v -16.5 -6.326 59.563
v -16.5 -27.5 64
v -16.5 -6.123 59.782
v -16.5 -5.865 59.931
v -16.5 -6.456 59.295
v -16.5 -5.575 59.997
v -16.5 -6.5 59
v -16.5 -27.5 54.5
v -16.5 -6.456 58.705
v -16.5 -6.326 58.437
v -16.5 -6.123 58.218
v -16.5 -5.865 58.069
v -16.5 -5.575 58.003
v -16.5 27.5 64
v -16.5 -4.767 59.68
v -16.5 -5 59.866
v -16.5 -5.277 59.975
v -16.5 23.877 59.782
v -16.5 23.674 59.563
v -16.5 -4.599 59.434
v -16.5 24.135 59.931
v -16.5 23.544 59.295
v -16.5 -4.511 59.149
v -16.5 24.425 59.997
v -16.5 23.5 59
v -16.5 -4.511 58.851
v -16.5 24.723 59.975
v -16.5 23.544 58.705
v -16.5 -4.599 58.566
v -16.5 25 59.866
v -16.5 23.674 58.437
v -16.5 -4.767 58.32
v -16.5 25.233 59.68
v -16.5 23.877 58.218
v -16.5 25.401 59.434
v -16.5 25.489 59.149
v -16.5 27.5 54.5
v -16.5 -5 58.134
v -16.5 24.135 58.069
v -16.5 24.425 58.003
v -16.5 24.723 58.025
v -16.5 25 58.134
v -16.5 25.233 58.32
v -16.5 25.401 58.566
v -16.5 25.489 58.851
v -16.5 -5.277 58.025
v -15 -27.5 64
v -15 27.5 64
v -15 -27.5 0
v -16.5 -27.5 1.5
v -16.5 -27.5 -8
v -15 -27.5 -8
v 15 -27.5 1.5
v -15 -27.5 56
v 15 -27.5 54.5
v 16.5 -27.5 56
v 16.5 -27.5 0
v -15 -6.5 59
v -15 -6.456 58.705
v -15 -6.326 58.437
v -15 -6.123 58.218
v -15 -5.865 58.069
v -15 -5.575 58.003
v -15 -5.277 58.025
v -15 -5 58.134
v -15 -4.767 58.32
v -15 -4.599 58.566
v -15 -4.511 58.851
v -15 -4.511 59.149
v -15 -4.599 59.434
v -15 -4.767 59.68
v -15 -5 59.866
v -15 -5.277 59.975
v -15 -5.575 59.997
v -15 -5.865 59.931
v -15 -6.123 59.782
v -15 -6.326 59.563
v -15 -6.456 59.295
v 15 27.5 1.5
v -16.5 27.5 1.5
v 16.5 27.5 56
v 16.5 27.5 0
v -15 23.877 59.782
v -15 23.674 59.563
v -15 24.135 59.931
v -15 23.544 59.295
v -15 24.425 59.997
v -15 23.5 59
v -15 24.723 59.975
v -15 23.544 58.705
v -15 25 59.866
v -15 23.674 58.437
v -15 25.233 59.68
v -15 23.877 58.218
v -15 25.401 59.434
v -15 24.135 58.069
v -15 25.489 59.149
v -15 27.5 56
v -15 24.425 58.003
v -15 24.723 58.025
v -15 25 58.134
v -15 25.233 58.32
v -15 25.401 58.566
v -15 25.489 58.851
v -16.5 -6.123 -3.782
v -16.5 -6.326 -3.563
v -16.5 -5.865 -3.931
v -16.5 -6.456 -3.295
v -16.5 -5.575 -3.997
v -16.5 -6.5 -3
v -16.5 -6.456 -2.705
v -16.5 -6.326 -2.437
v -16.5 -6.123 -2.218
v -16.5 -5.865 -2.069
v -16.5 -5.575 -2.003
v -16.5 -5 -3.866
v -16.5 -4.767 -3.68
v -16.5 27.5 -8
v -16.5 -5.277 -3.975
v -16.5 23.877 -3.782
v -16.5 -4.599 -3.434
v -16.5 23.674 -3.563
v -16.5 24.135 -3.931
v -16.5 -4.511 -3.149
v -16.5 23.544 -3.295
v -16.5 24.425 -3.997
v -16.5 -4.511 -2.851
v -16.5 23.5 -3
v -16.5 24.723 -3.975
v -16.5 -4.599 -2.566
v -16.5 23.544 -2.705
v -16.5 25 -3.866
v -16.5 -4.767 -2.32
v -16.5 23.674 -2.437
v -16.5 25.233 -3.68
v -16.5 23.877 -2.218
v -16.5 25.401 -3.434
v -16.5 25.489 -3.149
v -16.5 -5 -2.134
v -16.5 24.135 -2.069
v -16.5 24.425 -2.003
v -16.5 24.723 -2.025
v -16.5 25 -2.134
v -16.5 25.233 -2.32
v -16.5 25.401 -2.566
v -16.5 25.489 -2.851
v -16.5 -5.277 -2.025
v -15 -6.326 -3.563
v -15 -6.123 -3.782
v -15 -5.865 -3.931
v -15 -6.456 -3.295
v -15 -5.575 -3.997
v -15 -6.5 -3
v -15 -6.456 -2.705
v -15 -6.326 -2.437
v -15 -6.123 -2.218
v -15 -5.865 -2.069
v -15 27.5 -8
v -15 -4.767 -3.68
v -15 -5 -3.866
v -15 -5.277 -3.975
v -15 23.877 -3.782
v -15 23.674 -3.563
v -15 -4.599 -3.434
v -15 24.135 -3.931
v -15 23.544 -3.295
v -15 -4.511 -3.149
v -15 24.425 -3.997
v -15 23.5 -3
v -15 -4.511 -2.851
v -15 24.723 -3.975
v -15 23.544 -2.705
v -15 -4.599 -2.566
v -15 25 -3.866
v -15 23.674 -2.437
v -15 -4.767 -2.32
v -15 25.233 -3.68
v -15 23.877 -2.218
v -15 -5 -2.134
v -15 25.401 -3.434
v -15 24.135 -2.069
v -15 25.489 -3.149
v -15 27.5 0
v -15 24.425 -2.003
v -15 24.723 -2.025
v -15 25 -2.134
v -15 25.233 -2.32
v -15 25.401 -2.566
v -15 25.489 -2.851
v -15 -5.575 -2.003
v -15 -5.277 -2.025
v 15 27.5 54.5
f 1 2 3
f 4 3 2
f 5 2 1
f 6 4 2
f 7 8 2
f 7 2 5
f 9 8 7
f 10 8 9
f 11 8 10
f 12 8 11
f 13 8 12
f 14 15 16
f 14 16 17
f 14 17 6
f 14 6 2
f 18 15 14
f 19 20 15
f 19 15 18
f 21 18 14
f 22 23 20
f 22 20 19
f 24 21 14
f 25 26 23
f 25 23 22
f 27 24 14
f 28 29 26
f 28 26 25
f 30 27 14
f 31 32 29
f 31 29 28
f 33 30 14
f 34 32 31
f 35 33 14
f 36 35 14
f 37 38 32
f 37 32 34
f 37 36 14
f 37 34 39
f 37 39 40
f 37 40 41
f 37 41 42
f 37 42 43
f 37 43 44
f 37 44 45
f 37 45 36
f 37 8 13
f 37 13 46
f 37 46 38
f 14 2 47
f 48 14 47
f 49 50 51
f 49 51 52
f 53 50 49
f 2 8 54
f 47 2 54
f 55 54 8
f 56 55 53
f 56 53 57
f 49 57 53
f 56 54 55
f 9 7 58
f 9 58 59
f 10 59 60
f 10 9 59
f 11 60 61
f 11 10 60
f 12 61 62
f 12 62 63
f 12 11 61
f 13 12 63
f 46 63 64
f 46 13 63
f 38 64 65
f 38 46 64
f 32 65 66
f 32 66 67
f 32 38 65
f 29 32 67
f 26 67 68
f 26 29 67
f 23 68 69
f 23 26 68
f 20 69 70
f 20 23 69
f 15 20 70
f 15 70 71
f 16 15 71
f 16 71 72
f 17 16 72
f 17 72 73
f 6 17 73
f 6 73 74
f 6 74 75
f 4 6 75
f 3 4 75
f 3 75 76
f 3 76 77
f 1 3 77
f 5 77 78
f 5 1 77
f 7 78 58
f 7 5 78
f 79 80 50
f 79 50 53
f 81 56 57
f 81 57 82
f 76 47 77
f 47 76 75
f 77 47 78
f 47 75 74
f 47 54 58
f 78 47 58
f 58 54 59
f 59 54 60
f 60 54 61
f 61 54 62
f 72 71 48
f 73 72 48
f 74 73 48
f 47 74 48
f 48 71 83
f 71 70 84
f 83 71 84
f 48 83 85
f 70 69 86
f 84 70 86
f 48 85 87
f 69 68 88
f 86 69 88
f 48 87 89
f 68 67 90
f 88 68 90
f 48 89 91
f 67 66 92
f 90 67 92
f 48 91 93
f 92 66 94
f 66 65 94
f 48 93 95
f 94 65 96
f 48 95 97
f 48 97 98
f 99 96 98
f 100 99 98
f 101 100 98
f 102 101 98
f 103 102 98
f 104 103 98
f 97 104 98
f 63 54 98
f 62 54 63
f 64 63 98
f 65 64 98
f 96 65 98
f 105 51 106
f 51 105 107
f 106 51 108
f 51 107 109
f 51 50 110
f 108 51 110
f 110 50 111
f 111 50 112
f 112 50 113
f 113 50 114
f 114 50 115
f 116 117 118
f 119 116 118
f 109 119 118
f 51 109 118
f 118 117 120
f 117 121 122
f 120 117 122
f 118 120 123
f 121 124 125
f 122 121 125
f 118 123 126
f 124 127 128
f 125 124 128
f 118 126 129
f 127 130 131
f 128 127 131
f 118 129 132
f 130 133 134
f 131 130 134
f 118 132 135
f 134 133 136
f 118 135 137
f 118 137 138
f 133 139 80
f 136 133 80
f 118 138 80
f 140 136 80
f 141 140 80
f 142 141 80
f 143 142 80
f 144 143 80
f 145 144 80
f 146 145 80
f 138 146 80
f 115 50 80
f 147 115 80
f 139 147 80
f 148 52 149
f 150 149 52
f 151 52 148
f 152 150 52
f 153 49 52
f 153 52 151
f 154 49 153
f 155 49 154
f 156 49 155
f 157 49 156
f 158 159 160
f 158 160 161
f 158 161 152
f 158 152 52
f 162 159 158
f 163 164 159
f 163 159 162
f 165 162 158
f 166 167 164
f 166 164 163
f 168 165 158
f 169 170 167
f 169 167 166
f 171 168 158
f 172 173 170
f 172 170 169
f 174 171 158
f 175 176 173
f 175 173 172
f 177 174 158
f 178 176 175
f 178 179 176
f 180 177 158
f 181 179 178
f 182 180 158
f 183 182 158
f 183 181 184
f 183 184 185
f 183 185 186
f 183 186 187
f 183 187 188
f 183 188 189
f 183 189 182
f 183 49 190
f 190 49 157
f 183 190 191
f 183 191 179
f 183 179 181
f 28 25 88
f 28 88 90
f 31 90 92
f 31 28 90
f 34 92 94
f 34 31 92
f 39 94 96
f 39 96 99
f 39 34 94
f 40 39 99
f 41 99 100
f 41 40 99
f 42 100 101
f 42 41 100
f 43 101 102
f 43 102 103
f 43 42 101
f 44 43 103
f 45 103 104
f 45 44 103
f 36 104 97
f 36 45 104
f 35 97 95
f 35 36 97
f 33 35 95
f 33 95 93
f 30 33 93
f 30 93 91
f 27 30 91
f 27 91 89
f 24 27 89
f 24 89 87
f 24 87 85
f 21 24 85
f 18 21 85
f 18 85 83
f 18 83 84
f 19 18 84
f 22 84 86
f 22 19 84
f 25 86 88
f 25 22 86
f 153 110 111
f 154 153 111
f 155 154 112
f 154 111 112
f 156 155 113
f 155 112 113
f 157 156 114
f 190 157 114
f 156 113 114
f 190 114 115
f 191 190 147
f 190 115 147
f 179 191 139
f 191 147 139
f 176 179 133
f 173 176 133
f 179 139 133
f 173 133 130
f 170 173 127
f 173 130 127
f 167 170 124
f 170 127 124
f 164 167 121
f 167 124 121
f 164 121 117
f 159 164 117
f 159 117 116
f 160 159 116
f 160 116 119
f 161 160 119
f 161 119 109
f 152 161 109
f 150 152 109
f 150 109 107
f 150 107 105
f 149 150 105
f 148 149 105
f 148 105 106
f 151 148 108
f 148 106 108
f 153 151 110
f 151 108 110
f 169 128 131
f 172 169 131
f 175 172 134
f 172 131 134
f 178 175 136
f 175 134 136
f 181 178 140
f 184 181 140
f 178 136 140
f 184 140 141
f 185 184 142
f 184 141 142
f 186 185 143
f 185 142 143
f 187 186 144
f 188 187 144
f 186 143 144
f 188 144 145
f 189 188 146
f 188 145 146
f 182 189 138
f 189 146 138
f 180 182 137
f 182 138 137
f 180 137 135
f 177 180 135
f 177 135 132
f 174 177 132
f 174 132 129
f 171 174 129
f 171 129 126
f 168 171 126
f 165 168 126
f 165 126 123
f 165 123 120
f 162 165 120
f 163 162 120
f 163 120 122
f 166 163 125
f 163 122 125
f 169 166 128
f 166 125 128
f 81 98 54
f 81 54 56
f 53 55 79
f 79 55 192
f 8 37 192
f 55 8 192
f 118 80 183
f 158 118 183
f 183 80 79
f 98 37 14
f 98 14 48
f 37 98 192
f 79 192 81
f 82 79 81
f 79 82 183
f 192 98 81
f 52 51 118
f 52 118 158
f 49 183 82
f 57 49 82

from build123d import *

# Parameters (mm, degrees)
F0_W          = 30
F0_H          = 55
F1_DEPTH      = 1.5
F2_W          = 1.5
F2_H          = 55
F3_DEPTH      = 1.5
F3_DEPTH_BACK = 8
F4_DEPTH      = 28
F5_R          = 1
F6_DEPTH      = 1.5


with BuildPart() as f1:
    # F0 (on Top) → F1 (new body)
    with BuildSketch(Plane.XY):
        Rectangle(F0_W, F0_H)
    extrude(amount=F1_DEPTH)

    # F2 (on Top) → F3 (join, two sides)
    with BuildSketch(Plane.XY) as f3_sk:
        with Locations((-15.75, 0)):
            Rectangle(F2_W, F2_H)
    extrude(amount=F3_DEPTH)
    extrude(f3_sk.sketch, amount=-F3_DEPTH_BACK)

    # F2 (on Top) → F4 (join)
    with BuildSketch(Plane.XY):
        with Locations((15.75, 0)):
            Rectangle(F2_W, F2_H)
    extrude(amount=F4_DEPTH)

    # F5 (on face) → F6 (cut, through all)
    with BuildSketch(Plane(origin=(-16.5, 0, 0), x_dir=(0, -1, 0), z_dir=(-1, 0, 0))):
        with Locations((-24.5, -3)):
            Circle(F5_R)
        with Locations((5.5, -3)):
            Circle(F5_R)
    extrude(amount=-F6_DEPTH, mode=Mode.SUBTRACT)

    # F7: F1 across face


with BuildPart() as f1_1:
    add(f1.part)
    add(f1.part.mirror(Plane(origin=(15.75, 0, 28), x_dir=(1, 0, 0), z_dir=(0, 0, 1))))


solid = f1_1.part
